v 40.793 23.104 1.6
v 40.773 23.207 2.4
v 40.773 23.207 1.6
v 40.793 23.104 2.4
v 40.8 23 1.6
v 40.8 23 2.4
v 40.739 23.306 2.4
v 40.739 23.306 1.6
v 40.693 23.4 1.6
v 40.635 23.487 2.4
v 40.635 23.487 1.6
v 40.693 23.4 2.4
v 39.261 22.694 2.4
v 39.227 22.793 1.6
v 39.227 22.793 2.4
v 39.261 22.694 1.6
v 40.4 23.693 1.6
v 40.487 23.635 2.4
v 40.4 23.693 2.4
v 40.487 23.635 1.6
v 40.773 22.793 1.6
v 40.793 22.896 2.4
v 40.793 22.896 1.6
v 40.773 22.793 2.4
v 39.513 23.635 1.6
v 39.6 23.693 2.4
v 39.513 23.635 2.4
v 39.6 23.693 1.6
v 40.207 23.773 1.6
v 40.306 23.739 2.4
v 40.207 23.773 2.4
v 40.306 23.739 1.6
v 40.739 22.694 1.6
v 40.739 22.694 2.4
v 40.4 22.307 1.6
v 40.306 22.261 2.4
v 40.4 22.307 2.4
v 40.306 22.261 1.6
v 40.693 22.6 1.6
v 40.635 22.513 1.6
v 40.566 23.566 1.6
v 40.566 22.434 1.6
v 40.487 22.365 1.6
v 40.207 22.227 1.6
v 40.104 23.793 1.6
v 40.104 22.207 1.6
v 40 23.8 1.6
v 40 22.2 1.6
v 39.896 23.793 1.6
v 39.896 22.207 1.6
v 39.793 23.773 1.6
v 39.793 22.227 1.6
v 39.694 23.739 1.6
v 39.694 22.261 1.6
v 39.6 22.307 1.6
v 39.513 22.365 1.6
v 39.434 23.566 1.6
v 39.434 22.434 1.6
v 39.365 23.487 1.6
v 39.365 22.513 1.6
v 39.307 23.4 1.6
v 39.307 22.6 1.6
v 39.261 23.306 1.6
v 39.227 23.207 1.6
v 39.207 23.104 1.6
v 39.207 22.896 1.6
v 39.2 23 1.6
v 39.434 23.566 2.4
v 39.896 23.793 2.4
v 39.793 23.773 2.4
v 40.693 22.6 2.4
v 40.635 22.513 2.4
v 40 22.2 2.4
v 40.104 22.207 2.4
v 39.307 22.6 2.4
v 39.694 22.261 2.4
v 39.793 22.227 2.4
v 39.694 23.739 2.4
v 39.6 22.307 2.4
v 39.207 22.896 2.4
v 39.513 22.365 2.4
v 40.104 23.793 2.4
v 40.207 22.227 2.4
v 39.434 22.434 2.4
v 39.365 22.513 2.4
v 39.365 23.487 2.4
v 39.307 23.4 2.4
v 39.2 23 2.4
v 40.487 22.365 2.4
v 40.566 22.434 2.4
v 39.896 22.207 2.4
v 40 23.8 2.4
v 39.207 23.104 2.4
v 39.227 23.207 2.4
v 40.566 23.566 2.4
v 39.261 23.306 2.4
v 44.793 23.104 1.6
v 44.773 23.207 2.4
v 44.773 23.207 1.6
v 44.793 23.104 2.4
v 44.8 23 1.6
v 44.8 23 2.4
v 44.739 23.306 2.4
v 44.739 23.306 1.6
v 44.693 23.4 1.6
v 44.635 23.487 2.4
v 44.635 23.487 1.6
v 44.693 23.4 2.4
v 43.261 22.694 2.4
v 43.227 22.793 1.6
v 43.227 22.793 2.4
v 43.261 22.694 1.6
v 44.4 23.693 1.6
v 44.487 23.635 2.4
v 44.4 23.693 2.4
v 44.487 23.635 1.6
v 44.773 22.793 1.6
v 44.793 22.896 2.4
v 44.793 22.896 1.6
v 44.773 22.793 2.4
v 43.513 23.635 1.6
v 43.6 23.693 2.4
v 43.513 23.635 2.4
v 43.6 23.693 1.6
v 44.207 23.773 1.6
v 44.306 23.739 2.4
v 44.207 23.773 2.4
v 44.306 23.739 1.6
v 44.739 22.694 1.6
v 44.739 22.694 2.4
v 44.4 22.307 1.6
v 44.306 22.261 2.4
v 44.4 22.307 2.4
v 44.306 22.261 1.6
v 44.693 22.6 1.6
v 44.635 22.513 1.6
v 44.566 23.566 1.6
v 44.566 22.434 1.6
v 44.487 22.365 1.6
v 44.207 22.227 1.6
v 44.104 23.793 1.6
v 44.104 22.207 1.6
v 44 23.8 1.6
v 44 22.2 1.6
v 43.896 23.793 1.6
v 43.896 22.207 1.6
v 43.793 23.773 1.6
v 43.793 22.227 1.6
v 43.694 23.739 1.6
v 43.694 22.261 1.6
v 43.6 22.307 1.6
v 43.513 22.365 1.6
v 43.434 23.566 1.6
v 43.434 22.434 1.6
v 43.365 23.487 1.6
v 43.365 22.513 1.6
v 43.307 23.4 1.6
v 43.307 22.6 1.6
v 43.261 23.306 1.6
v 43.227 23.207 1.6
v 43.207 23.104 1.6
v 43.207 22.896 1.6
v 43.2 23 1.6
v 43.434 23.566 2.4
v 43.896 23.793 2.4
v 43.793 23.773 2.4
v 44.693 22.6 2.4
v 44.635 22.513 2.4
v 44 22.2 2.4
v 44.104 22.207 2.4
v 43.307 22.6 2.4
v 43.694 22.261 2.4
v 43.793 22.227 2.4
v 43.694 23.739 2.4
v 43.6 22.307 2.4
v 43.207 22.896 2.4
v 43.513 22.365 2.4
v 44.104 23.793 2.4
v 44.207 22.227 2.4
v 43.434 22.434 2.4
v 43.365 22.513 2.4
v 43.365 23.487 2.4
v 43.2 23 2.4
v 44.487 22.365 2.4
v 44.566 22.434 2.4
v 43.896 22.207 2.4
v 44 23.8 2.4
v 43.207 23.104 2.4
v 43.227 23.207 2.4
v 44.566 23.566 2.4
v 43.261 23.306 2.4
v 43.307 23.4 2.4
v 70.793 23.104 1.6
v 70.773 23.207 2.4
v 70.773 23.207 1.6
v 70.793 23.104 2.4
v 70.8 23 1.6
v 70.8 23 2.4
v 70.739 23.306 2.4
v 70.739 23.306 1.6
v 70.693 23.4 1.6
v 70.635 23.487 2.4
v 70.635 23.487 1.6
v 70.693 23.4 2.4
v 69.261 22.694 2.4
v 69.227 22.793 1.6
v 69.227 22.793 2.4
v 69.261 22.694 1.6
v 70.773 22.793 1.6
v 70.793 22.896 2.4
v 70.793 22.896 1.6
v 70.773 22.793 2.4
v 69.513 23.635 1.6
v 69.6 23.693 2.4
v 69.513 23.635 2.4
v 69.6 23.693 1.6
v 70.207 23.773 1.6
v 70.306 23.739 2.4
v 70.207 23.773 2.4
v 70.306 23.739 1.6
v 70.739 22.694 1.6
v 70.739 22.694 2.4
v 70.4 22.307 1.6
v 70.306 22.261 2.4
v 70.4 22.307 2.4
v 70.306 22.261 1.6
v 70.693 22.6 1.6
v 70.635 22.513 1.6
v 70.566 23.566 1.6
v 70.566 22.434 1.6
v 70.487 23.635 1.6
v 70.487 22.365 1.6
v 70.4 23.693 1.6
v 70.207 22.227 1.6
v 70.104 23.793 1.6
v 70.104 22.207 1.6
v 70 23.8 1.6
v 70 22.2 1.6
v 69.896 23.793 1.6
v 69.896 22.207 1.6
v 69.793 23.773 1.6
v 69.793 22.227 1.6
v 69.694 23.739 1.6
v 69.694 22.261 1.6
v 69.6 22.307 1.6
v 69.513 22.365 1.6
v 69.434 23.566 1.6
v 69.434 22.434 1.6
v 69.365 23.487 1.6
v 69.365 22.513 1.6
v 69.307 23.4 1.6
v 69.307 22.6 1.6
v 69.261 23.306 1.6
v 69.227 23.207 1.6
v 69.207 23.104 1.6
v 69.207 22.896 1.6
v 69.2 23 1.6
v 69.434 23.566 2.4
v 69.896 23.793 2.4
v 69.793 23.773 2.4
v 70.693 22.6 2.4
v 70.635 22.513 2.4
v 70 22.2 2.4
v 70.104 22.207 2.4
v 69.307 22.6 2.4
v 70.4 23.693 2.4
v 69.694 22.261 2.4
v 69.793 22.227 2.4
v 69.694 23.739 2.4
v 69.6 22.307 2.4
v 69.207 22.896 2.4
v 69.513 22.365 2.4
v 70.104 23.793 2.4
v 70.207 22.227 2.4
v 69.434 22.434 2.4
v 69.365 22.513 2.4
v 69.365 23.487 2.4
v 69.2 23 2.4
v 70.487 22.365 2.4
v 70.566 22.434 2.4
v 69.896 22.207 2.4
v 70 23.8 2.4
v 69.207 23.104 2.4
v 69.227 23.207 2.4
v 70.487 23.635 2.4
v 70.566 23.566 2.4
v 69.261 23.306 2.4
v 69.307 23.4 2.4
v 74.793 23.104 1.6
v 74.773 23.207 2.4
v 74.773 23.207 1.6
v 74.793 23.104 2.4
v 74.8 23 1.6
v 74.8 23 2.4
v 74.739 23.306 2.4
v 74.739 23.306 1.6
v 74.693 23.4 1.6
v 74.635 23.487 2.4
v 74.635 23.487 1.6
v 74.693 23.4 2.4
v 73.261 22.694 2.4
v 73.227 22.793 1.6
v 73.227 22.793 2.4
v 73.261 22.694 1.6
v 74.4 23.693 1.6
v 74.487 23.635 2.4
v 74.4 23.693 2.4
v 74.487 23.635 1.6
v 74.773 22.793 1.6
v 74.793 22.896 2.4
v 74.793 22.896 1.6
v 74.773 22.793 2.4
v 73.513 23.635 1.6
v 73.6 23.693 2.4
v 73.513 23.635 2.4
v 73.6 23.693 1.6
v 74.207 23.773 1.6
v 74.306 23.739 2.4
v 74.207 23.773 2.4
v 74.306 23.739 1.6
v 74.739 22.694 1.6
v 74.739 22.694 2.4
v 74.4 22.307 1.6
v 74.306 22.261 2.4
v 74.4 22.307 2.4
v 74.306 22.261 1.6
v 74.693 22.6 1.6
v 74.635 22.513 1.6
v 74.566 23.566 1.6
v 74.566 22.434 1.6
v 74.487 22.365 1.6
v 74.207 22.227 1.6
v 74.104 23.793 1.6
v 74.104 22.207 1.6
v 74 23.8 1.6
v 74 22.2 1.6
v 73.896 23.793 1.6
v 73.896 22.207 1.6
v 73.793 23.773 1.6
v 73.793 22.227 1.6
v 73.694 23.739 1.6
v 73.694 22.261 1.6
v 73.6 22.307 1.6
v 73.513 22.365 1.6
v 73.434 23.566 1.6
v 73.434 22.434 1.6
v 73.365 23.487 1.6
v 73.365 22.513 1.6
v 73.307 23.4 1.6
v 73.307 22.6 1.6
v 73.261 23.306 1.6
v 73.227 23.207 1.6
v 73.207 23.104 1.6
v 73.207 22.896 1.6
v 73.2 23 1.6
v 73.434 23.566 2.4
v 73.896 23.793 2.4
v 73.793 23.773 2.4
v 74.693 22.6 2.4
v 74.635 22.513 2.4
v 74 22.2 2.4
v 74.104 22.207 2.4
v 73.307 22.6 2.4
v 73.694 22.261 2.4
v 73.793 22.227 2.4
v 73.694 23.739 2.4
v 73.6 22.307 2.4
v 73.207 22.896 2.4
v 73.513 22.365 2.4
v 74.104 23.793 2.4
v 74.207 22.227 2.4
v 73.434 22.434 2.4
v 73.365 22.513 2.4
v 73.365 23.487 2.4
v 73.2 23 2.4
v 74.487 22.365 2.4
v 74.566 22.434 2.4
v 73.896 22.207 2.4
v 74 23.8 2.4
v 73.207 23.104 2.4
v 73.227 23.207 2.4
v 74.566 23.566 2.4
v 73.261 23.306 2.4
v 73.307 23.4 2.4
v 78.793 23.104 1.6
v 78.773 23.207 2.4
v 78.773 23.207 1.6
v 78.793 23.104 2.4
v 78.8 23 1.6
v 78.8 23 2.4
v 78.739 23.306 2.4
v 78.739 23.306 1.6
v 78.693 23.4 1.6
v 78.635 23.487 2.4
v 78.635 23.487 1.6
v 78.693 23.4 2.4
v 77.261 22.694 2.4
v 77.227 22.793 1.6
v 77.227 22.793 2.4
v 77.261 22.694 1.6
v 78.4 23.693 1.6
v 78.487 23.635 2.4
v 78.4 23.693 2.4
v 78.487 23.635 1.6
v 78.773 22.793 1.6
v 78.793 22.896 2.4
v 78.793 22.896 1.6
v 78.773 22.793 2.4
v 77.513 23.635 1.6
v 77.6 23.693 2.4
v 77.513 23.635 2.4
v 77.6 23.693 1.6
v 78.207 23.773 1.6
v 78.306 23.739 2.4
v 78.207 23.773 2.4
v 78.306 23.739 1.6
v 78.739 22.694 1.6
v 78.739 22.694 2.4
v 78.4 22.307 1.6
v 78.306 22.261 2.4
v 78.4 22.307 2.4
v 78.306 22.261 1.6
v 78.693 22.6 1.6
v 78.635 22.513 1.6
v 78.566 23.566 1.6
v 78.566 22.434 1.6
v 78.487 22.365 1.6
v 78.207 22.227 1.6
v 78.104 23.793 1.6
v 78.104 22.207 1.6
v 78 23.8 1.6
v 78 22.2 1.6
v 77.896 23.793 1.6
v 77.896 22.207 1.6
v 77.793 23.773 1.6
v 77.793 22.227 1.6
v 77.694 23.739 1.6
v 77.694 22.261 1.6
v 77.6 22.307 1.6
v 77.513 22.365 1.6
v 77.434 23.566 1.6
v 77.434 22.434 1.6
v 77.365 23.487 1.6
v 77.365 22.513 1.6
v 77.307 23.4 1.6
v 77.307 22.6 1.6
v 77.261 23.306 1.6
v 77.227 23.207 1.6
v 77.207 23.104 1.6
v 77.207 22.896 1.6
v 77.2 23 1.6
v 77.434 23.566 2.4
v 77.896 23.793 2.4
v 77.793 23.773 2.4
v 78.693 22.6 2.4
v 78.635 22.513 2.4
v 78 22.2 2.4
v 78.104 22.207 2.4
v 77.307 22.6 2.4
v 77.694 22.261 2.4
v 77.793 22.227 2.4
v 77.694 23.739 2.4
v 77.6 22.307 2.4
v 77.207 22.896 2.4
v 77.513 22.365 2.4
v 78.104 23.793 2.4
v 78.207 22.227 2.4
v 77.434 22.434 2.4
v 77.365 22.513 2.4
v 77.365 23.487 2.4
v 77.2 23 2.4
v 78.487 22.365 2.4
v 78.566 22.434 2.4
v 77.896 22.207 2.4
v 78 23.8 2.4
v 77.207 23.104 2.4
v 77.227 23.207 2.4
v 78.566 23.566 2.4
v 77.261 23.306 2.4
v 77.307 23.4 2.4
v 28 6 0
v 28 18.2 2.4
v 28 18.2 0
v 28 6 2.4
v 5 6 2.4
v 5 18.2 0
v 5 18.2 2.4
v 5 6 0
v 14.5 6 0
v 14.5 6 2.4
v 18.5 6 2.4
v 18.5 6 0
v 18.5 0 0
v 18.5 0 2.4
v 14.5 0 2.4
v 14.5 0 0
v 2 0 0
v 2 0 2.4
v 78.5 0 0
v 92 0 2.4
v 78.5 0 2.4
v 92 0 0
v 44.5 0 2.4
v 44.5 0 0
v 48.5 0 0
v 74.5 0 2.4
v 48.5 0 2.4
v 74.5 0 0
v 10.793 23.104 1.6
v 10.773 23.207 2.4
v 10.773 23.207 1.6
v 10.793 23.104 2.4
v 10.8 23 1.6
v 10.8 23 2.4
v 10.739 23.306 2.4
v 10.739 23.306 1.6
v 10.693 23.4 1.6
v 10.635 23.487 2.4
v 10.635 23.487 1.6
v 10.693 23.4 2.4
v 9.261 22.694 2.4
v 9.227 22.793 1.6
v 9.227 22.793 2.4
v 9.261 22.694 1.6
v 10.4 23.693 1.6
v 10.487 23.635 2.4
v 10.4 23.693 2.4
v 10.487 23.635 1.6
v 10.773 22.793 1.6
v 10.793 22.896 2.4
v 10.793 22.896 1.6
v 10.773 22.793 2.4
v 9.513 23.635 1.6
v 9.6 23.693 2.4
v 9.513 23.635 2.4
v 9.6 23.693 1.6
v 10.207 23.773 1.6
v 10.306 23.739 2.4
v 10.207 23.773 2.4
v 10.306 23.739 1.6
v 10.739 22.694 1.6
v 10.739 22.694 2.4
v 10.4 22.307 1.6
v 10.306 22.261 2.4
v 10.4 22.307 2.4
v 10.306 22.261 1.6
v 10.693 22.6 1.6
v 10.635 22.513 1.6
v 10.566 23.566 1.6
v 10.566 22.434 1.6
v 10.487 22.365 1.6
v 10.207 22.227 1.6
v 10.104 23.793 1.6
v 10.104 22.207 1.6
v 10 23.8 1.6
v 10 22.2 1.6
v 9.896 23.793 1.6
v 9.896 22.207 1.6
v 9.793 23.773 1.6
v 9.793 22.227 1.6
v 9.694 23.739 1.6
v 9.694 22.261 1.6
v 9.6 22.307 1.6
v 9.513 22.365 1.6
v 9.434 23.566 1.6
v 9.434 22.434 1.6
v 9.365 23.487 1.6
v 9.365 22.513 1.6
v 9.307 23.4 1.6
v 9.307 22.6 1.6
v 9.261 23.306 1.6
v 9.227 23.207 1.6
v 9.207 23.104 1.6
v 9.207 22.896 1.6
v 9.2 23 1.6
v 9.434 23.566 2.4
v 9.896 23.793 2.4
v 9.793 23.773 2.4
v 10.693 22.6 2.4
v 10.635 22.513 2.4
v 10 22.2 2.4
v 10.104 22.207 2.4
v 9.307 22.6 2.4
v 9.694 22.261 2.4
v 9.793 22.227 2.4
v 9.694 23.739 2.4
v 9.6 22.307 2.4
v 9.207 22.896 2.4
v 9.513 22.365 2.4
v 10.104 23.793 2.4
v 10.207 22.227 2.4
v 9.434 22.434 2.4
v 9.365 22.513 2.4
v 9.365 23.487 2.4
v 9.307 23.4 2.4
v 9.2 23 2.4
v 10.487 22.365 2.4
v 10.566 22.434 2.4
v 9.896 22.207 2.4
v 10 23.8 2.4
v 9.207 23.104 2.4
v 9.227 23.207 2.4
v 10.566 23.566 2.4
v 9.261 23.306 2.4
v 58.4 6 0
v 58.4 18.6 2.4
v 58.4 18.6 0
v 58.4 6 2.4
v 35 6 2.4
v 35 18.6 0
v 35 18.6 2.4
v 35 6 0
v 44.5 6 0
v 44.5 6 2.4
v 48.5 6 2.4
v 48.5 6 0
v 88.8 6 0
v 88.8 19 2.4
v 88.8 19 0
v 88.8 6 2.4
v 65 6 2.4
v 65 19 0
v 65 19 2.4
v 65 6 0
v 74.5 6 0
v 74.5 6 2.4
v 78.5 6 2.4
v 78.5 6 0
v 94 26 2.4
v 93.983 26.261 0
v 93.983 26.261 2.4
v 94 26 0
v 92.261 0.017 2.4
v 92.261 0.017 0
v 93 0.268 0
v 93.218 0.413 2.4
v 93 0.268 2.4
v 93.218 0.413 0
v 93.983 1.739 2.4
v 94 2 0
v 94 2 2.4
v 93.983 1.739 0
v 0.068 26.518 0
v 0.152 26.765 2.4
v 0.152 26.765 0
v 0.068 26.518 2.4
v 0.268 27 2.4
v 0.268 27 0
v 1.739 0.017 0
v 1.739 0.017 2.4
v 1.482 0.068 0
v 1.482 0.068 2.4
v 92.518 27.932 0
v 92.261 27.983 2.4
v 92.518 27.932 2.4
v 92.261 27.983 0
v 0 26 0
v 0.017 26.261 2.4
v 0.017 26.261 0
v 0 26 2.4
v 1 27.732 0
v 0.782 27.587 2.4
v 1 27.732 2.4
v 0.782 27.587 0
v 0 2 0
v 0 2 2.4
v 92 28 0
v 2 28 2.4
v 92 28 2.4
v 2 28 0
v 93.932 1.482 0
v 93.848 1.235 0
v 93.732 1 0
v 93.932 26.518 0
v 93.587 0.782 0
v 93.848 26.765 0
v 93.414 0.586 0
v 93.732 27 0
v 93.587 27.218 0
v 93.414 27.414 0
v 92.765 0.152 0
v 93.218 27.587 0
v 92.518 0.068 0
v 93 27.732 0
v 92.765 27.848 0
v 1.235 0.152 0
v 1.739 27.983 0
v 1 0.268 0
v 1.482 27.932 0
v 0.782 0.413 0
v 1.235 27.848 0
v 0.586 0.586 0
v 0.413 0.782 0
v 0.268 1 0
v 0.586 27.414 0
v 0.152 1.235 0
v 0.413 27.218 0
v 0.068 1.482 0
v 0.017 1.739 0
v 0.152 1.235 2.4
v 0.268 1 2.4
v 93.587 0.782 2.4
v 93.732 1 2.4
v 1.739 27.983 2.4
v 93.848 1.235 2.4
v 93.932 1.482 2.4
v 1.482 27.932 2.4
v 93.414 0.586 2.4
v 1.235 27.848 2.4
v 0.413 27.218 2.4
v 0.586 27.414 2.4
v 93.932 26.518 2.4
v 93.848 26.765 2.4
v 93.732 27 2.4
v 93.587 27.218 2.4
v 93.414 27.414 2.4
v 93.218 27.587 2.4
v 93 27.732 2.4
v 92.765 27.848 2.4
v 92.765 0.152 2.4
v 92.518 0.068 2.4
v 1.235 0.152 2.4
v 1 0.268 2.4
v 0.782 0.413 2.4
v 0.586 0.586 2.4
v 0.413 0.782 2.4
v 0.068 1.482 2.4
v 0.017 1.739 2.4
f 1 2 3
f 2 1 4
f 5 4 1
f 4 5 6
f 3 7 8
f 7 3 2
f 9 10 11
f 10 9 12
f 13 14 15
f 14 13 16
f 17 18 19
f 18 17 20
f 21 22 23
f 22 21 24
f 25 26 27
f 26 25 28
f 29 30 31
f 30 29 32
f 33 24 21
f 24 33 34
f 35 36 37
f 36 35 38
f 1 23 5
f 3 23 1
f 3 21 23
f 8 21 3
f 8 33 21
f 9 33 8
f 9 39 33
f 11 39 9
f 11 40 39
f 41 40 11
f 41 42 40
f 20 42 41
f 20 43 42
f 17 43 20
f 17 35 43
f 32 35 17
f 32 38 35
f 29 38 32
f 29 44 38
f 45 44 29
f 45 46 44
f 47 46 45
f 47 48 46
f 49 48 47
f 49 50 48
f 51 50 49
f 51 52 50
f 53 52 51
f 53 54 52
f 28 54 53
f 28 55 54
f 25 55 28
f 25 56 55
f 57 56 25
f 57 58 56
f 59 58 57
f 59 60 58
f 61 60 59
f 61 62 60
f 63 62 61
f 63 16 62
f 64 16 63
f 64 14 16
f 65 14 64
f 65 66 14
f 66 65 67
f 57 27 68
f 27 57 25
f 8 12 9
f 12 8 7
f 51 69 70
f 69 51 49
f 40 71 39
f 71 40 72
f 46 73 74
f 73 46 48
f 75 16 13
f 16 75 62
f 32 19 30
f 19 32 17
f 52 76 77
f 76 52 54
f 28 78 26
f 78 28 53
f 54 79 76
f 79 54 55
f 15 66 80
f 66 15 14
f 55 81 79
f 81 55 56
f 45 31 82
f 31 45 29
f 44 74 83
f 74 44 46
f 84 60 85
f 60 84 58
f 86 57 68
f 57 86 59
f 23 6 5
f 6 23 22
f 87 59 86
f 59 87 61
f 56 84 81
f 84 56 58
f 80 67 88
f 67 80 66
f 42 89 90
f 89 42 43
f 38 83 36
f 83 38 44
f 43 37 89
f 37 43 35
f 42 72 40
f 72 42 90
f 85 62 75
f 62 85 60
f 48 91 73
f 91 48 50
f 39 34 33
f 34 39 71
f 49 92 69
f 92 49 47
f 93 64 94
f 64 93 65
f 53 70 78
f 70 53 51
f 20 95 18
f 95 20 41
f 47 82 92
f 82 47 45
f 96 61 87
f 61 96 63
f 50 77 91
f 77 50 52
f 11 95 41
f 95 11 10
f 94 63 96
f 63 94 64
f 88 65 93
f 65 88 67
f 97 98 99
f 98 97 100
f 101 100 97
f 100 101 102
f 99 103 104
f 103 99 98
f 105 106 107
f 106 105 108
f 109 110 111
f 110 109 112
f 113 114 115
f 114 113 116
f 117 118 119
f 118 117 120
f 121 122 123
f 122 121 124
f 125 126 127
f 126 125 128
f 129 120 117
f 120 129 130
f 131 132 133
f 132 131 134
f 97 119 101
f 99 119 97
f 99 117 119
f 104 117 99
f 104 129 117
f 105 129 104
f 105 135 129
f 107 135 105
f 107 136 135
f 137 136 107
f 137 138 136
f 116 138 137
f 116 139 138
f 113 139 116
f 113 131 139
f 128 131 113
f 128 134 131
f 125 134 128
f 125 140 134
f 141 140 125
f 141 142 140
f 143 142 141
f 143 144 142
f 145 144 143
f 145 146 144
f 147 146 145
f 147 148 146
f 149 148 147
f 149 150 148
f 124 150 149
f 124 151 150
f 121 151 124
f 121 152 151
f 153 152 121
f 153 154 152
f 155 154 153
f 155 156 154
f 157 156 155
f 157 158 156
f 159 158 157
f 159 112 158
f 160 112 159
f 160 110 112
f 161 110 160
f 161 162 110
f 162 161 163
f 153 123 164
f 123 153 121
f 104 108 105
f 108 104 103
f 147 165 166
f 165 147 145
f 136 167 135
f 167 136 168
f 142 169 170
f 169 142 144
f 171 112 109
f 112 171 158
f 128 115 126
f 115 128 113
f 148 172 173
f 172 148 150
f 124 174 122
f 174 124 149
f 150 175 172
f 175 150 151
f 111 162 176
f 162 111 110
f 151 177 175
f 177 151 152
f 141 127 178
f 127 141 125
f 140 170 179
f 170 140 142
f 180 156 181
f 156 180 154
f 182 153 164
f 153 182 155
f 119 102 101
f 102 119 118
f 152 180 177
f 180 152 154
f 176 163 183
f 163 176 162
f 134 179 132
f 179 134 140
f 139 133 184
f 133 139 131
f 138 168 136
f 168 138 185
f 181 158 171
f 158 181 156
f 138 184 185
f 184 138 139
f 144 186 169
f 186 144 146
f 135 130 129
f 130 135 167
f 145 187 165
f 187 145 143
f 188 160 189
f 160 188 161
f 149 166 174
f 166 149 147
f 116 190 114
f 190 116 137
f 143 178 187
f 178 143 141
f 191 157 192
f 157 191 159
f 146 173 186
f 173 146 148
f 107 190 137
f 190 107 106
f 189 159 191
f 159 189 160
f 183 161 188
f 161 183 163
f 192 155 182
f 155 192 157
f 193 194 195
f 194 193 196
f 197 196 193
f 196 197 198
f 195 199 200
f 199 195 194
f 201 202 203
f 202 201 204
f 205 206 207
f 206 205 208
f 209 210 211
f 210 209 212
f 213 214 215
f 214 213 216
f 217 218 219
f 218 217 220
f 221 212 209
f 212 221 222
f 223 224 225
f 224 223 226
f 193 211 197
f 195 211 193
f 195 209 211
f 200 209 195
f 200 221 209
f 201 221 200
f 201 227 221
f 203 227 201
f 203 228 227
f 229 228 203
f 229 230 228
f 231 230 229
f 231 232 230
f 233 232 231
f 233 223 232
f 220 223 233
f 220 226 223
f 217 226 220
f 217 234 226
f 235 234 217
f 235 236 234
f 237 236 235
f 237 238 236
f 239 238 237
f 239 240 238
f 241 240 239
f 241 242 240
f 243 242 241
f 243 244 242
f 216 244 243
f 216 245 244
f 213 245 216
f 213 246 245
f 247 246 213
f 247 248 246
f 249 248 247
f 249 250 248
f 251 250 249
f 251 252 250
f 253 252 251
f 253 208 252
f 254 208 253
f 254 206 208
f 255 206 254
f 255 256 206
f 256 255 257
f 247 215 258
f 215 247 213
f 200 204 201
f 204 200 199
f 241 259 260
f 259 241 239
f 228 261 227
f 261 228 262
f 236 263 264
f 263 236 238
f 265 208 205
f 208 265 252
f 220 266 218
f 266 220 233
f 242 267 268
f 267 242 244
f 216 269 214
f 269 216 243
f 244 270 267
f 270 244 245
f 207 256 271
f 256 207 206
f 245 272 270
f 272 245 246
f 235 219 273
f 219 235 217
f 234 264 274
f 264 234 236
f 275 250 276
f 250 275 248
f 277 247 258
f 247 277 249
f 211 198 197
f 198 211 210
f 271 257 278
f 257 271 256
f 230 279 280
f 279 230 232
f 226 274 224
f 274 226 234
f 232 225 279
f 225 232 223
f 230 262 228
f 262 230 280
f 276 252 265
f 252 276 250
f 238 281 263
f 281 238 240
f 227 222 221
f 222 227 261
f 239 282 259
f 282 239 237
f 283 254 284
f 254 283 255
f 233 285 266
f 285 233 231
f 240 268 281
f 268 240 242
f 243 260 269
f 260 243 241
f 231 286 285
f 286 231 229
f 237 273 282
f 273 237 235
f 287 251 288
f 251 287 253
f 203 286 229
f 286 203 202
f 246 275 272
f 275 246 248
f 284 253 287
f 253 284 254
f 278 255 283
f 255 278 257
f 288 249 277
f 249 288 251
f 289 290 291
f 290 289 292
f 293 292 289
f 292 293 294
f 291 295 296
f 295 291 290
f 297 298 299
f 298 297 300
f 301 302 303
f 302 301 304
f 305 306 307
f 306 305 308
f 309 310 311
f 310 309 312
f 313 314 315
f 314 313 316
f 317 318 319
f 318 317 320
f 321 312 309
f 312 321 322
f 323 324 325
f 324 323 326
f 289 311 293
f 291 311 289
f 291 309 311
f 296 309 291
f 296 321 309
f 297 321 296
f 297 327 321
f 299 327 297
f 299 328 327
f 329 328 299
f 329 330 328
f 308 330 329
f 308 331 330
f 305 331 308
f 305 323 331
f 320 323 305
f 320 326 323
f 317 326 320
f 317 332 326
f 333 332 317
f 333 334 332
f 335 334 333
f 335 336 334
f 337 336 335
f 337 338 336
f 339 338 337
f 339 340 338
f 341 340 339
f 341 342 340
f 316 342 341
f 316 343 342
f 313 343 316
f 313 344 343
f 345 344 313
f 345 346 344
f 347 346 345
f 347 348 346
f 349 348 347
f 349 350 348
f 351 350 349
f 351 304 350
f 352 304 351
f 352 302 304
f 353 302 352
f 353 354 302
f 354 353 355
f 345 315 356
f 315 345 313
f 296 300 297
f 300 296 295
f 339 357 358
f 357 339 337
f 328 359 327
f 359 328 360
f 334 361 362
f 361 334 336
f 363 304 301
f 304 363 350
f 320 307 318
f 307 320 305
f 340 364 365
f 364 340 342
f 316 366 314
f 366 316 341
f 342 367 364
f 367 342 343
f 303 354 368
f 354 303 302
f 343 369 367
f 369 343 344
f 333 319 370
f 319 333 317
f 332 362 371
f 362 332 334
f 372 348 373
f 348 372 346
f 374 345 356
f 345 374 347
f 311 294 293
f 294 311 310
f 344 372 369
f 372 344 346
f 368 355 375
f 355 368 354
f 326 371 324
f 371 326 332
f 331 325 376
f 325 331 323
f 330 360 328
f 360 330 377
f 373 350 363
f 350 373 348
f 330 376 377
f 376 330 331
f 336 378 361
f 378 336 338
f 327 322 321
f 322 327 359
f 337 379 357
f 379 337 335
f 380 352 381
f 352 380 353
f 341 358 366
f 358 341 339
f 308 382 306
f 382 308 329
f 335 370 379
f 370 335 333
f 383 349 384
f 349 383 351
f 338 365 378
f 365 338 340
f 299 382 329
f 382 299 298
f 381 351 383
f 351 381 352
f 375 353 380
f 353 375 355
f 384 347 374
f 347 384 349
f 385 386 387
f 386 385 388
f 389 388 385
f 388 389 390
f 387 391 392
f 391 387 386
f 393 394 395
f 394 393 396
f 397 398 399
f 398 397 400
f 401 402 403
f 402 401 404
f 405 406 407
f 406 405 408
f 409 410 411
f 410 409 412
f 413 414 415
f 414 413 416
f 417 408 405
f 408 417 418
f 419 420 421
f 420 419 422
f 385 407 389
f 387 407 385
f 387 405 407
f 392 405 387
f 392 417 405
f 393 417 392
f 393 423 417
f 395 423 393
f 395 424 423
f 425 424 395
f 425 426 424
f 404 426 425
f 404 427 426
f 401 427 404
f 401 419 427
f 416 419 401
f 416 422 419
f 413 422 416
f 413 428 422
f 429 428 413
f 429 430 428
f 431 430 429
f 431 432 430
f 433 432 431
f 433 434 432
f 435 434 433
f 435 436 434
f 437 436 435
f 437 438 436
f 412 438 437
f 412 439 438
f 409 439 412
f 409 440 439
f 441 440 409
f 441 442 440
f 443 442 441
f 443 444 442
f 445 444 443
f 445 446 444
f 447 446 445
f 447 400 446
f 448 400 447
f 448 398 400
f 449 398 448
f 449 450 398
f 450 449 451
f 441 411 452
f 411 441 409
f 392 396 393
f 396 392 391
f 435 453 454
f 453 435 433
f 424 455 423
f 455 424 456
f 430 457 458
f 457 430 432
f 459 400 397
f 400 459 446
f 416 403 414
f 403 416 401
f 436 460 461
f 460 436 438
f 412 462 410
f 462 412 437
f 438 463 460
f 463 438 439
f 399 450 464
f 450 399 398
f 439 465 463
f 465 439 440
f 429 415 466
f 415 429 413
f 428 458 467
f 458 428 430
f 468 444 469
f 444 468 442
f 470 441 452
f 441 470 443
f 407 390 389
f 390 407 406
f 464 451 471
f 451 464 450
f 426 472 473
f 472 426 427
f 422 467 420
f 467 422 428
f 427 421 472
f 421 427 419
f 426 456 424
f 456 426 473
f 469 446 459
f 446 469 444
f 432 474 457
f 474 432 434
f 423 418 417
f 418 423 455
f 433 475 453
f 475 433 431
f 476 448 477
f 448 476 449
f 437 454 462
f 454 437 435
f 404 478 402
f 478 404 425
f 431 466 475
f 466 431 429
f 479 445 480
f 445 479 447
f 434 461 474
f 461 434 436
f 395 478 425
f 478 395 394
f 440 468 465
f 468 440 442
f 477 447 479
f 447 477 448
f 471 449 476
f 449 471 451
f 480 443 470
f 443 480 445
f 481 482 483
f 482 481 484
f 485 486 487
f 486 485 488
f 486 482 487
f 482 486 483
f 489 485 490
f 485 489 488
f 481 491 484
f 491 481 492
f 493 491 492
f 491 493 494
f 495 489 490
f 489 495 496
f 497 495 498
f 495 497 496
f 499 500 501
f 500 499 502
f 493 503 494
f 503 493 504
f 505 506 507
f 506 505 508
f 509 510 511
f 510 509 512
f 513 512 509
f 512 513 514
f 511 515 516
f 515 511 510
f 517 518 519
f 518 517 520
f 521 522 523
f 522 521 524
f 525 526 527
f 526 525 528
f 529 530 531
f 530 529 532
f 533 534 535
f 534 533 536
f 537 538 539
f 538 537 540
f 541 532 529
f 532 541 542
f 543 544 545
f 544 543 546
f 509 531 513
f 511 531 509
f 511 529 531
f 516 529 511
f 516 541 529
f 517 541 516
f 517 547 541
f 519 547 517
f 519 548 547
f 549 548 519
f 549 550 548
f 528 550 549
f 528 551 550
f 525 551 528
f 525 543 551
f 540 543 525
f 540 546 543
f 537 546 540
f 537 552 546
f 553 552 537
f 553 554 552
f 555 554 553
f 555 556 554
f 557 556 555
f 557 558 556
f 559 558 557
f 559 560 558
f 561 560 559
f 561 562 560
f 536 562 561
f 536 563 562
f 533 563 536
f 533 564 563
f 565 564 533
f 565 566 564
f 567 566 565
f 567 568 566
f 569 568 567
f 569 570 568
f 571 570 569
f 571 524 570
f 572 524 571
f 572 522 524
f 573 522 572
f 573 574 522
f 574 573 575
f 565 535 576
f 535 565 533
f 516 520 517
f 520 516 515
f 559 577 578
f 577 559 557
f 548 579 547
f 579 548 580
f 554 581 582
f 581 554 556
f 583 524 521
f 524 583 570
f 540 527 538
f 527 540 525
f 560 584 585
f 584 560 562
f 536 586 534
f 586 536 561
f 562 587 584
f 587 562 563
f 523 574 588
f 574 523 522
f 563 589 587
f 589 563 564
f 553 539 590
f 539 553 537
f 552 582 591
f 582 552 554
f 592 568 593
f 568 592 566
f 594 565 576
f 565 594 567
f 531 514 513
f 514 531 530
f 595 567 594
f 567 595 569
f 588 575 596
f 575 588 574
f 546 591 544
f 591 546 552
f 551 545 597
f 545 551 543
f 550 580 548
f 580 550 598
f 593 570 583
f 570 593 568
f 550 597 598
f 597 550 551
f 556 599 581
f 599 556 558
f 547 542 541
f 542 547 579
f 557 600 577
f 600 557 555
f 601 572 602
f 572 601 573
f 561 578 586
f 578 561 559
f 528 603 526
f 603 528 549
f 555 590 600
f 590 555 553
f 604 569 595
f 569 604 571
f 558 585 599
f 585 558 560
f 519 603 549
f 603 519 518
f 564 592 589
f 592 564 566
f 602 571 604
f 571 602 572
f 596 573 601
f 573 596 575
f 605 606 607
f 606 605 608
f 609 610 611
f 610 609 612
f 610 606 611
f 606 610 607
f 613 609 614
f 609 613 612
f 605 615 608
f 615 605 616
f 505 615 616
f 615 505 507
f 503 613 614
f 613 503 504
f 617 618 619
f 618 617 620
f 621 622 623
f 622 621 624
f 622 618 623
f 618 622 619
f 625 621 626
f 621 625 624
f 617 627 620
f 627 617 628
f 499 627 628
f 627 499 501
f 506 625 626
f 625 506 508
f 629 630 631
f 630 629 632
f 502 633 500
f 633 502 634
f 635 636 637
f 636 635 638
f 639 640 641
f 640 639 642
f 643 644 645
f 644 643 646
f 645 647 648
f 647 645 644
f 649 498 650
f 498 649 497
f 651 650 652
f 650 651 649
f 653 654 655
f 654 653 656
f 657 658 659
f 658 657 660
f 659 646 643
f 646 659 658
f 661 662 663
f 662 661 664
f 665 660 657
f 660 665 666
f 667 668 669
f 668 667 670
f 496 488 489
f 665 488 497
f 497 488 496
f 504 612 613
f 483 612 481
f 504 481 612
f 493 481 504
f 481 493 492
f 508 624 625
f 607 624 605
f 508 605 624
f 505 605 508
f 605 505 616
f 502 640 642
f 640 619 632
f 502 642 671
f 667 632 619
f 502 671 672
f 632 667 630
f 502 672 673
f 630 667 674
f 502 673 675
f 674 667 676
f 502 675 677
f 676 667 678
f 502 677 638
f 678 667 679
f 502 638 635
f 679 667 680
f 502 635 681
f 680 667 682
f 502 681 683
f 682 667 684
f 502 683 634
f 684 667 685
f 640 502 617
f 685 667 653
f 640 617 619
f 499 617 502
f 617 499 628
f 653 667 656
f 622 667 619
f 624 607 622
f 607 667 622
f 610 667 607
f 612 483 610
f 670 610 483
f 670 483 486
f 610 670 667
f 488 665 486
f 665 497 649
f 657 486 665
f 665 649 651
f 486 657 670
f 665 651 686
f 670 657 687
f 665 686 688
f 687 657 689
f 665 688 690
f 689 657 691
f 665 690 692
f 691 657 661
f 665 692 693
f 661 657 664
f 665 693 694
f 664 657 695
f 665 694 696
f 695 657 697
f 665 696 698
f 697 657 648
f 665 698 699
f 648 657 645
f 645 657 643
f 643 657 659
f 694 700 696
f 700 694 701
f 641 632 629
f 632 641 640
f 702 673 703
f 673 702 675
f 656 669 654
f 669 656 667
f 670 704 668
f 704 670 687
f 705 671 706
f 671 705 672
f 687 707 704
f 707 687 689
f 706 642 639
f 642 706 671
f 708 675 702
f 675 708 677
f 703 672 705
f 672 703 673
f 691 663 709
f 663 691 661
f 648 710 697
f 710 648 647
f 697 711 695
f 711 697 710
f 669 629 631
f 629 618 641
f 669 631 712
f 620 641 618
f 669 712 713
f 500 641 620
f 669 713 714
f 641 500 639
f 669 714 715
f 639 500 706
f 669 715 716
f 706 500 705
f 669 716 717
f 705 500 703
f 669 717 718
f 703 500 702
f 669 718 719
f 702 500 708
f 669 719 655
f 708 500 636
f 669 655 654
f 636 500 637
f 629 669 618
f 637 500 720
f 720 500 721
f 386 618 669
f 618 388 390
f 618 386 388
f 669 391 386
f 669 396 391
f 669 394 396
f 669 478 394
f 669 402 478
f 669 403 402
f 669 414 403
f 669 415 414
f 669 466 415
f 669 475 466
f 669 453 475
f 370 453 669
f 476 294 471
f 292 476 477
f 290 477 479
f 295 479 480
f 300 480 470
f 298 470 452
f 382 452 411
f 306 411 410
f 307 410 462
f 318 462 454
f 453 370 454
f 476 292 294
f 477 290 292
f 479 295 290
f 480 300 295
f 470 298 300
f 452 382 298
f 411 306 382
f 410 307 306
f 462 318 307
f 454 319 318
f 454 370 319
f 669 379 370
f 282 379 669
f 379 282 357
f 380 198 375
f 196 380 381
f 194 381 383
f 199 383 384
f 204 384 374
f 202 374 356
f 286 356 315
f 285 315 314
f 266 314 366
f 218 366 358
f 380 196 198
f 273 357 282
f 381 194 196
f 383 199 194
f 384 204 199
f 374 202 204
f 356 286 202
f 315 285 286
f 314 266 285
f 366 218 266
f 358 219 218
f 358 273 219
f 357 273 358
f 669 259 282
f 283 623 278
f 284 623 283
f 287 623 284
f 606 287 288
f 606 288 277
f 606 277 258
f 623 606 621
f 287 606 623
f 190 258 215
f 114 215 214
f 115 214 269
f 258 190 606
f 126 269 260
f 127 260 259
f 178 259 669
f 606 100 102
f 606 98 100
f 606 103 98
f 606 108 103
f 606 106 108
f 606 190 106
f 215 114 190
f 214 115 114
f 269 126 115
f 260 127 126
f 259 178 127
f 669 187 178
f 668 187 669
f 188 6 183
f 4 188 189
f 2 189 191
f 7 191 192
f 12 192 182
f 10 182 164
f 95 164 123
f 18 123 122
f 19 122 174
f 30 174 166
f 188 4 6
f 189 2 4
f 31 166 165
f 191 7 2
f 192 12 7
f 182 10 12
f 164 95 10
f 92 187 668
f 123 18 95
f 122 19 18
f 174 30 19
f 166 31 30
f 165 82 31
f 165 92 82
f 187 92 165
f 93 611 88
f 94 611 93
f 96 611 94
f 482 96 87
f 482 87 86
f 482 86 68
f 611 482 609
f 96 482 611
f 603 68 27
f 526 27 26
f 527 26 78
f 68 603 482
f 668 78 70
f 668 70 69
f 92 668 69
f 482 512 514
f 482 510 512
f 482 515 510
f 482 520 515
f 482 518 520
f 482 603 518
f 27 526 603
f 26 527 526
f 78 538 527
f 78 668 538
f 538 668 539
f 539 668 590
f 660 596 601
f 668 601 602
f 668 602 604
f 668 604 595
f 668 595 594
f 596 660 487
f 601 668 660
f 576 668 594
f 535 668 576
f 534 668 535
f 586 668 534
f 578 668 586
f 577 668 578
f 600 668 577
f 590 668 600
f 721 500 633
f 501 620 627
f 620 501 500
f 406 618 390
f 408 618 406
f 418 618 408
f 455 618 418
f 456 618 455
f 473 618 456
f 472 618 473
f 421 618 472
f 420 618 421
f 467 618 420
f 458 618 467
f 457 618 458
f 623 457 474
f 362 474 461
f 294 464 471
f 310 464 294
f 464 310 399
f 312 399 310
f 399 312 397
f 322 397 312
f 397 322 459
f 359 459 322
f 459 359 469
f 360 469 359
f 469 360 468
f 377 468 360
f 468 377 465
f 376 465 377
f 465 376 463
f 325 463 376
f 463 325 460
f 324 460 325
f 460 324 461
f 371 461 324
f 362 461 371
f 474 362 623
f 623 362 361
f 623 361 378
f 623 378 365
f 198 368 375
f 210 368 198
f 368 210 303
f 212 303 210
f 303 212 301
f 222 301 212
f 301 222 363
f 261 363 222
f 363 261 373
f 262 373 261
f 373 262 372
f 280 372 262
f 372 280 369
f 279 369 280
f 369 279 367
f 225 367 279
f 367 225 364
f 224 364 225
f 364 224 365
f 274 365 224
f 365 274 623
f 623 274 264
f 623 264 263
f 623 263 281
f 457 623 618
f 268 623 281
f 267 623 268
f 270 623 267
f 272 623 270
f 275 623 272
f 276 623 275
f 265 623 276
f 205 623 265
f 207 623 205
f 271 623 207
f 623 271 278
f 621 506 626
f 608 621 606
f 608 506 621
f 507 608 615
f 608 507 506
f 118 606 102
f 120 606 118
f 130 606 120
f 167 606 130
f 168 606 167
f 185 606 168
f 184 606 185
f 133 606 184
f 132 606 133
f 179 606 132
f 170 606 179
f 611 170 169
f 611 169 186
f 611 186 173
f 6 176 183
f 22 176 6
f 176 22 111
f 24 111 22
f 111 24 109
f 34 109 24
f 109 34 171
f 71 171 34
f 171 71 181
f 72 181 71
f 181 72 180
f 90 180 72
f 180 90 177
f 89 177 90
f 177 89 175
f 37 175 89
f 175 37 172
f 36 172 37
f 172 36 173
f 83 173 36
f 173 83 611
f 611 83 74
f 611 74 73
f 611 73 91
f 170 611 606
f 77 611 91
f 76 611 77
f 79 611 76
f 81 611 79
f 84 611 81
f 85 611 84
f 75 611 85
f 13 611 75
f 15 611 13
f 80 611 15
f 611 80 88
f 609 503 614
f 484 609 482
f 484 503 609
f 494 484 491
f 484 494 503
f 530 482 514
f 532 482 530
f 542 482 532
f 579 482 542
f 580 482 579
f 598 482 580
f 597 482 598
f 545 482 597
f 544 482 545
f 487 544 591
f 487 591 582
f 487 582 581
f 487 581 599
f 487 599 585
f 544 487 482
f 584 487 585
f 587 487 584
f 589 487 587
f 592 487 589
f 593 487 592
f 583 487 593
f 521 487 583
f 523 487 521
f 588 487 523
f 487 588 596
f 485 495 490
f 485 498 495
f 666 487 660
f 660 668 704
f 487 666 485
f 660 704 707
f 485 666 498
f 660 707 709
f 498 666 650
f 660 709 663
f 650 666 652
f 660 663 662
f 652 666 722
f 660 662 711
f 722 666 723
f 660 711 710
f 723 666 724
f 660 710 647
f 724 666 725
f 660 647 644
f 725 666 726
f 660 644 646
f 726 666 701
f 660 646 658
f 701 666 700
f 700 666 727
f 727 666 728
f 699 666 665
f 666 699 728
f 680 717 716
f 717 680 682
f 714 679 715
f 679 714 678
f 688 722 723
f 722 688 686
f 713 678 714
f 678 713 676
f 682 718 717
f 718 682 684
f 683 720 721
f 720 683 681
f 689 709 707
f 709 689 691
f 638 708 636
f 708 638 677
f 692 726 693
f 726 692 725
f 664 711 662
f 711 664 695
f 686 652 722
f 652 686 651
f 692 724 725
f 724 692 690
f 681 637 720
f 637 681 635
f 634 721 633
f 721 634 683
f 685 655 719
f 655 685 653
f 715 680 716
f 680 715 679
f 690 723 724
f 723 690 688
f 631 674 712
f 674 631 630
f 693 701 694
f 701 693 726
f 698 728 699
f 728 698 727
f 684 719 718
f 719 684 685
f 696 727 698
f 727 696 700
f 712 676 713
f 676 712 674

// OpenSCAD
// Original parametric fit samples. Units: mm. Not structural robot parts.
// Export with: openscad -o servo-fit-gauge.stl -D 'part="servo"' fit-tests.scad
part = "servo"; // [servo,oled]
$fn = 48;

// Provisional nominal dimensions, deliberately adjustable for clone hardware.
servo_length = 23.0;
servo_width = 12.2;
servo_clearances = [0.0, 0.4, 0.8]; // total added to aperture length and width
oled_board_width = 27.5;
oled_board_height = 27.8;
oled_clearance = 0.5;
wall = 2.0;

module rounded_plate(w,h,z,r=2) {
  linear_extrude(z) offset(r=r) offset(delta=-r) square([w,h]);
}

module servo_gauge() {
  // Three through-apertures: slide the servo body in only until its ears meet
  // the plate. The cable exits through a notch; no force or screws needed.
  difference() {
    rounded_plate(94, 28, 2.4);
    for(i=[0:2]) {
      gap = servo_clearances[i];
      translate([5+i*30,6,-0.1]) cube([servo_length+gap,servo_width+gap,2.6]);
      translate([5+i*30+servo_length/2-2,0,-0.1]) cube([4,7,2.6]);
      // One, two, three index dimples on the closed edge, readable without text fonts.
      for(j=[0:i]) translate([10+i*30+j*4,23,1.6]) cylinder(h=1,r=0.8);
    }
  }
}

module oled_gauge() {
  // Through-aperture checks board outline only: no lip bears on the glass.
  // This is not a retaining bracket; support the module with your hand.
  w=oled_board_width+oled_clearance;
  h=oled_board_height+oled_clearance;
  difference() {
    rounded_plate(w+2*wall,h+2*wall,2.4);
    translate([wall,wall,-0.1]) cube([w,h,3]);
    // Full-width header-edge opening, so installed pin headers aren't trapped.
    translate([wall+2,h+wall-1,-0.1]) cube([w-4,4,3]);
  }
}

assert(servo_length>0 && servo_width>0 && wall>=1);
assert(oled_board_width>0 && oled_board_height>0);
if(part=="servo") servo_gauge();
else if(part=="oled") oled_gauge();
else assert(false,"part must be servo or oled");
